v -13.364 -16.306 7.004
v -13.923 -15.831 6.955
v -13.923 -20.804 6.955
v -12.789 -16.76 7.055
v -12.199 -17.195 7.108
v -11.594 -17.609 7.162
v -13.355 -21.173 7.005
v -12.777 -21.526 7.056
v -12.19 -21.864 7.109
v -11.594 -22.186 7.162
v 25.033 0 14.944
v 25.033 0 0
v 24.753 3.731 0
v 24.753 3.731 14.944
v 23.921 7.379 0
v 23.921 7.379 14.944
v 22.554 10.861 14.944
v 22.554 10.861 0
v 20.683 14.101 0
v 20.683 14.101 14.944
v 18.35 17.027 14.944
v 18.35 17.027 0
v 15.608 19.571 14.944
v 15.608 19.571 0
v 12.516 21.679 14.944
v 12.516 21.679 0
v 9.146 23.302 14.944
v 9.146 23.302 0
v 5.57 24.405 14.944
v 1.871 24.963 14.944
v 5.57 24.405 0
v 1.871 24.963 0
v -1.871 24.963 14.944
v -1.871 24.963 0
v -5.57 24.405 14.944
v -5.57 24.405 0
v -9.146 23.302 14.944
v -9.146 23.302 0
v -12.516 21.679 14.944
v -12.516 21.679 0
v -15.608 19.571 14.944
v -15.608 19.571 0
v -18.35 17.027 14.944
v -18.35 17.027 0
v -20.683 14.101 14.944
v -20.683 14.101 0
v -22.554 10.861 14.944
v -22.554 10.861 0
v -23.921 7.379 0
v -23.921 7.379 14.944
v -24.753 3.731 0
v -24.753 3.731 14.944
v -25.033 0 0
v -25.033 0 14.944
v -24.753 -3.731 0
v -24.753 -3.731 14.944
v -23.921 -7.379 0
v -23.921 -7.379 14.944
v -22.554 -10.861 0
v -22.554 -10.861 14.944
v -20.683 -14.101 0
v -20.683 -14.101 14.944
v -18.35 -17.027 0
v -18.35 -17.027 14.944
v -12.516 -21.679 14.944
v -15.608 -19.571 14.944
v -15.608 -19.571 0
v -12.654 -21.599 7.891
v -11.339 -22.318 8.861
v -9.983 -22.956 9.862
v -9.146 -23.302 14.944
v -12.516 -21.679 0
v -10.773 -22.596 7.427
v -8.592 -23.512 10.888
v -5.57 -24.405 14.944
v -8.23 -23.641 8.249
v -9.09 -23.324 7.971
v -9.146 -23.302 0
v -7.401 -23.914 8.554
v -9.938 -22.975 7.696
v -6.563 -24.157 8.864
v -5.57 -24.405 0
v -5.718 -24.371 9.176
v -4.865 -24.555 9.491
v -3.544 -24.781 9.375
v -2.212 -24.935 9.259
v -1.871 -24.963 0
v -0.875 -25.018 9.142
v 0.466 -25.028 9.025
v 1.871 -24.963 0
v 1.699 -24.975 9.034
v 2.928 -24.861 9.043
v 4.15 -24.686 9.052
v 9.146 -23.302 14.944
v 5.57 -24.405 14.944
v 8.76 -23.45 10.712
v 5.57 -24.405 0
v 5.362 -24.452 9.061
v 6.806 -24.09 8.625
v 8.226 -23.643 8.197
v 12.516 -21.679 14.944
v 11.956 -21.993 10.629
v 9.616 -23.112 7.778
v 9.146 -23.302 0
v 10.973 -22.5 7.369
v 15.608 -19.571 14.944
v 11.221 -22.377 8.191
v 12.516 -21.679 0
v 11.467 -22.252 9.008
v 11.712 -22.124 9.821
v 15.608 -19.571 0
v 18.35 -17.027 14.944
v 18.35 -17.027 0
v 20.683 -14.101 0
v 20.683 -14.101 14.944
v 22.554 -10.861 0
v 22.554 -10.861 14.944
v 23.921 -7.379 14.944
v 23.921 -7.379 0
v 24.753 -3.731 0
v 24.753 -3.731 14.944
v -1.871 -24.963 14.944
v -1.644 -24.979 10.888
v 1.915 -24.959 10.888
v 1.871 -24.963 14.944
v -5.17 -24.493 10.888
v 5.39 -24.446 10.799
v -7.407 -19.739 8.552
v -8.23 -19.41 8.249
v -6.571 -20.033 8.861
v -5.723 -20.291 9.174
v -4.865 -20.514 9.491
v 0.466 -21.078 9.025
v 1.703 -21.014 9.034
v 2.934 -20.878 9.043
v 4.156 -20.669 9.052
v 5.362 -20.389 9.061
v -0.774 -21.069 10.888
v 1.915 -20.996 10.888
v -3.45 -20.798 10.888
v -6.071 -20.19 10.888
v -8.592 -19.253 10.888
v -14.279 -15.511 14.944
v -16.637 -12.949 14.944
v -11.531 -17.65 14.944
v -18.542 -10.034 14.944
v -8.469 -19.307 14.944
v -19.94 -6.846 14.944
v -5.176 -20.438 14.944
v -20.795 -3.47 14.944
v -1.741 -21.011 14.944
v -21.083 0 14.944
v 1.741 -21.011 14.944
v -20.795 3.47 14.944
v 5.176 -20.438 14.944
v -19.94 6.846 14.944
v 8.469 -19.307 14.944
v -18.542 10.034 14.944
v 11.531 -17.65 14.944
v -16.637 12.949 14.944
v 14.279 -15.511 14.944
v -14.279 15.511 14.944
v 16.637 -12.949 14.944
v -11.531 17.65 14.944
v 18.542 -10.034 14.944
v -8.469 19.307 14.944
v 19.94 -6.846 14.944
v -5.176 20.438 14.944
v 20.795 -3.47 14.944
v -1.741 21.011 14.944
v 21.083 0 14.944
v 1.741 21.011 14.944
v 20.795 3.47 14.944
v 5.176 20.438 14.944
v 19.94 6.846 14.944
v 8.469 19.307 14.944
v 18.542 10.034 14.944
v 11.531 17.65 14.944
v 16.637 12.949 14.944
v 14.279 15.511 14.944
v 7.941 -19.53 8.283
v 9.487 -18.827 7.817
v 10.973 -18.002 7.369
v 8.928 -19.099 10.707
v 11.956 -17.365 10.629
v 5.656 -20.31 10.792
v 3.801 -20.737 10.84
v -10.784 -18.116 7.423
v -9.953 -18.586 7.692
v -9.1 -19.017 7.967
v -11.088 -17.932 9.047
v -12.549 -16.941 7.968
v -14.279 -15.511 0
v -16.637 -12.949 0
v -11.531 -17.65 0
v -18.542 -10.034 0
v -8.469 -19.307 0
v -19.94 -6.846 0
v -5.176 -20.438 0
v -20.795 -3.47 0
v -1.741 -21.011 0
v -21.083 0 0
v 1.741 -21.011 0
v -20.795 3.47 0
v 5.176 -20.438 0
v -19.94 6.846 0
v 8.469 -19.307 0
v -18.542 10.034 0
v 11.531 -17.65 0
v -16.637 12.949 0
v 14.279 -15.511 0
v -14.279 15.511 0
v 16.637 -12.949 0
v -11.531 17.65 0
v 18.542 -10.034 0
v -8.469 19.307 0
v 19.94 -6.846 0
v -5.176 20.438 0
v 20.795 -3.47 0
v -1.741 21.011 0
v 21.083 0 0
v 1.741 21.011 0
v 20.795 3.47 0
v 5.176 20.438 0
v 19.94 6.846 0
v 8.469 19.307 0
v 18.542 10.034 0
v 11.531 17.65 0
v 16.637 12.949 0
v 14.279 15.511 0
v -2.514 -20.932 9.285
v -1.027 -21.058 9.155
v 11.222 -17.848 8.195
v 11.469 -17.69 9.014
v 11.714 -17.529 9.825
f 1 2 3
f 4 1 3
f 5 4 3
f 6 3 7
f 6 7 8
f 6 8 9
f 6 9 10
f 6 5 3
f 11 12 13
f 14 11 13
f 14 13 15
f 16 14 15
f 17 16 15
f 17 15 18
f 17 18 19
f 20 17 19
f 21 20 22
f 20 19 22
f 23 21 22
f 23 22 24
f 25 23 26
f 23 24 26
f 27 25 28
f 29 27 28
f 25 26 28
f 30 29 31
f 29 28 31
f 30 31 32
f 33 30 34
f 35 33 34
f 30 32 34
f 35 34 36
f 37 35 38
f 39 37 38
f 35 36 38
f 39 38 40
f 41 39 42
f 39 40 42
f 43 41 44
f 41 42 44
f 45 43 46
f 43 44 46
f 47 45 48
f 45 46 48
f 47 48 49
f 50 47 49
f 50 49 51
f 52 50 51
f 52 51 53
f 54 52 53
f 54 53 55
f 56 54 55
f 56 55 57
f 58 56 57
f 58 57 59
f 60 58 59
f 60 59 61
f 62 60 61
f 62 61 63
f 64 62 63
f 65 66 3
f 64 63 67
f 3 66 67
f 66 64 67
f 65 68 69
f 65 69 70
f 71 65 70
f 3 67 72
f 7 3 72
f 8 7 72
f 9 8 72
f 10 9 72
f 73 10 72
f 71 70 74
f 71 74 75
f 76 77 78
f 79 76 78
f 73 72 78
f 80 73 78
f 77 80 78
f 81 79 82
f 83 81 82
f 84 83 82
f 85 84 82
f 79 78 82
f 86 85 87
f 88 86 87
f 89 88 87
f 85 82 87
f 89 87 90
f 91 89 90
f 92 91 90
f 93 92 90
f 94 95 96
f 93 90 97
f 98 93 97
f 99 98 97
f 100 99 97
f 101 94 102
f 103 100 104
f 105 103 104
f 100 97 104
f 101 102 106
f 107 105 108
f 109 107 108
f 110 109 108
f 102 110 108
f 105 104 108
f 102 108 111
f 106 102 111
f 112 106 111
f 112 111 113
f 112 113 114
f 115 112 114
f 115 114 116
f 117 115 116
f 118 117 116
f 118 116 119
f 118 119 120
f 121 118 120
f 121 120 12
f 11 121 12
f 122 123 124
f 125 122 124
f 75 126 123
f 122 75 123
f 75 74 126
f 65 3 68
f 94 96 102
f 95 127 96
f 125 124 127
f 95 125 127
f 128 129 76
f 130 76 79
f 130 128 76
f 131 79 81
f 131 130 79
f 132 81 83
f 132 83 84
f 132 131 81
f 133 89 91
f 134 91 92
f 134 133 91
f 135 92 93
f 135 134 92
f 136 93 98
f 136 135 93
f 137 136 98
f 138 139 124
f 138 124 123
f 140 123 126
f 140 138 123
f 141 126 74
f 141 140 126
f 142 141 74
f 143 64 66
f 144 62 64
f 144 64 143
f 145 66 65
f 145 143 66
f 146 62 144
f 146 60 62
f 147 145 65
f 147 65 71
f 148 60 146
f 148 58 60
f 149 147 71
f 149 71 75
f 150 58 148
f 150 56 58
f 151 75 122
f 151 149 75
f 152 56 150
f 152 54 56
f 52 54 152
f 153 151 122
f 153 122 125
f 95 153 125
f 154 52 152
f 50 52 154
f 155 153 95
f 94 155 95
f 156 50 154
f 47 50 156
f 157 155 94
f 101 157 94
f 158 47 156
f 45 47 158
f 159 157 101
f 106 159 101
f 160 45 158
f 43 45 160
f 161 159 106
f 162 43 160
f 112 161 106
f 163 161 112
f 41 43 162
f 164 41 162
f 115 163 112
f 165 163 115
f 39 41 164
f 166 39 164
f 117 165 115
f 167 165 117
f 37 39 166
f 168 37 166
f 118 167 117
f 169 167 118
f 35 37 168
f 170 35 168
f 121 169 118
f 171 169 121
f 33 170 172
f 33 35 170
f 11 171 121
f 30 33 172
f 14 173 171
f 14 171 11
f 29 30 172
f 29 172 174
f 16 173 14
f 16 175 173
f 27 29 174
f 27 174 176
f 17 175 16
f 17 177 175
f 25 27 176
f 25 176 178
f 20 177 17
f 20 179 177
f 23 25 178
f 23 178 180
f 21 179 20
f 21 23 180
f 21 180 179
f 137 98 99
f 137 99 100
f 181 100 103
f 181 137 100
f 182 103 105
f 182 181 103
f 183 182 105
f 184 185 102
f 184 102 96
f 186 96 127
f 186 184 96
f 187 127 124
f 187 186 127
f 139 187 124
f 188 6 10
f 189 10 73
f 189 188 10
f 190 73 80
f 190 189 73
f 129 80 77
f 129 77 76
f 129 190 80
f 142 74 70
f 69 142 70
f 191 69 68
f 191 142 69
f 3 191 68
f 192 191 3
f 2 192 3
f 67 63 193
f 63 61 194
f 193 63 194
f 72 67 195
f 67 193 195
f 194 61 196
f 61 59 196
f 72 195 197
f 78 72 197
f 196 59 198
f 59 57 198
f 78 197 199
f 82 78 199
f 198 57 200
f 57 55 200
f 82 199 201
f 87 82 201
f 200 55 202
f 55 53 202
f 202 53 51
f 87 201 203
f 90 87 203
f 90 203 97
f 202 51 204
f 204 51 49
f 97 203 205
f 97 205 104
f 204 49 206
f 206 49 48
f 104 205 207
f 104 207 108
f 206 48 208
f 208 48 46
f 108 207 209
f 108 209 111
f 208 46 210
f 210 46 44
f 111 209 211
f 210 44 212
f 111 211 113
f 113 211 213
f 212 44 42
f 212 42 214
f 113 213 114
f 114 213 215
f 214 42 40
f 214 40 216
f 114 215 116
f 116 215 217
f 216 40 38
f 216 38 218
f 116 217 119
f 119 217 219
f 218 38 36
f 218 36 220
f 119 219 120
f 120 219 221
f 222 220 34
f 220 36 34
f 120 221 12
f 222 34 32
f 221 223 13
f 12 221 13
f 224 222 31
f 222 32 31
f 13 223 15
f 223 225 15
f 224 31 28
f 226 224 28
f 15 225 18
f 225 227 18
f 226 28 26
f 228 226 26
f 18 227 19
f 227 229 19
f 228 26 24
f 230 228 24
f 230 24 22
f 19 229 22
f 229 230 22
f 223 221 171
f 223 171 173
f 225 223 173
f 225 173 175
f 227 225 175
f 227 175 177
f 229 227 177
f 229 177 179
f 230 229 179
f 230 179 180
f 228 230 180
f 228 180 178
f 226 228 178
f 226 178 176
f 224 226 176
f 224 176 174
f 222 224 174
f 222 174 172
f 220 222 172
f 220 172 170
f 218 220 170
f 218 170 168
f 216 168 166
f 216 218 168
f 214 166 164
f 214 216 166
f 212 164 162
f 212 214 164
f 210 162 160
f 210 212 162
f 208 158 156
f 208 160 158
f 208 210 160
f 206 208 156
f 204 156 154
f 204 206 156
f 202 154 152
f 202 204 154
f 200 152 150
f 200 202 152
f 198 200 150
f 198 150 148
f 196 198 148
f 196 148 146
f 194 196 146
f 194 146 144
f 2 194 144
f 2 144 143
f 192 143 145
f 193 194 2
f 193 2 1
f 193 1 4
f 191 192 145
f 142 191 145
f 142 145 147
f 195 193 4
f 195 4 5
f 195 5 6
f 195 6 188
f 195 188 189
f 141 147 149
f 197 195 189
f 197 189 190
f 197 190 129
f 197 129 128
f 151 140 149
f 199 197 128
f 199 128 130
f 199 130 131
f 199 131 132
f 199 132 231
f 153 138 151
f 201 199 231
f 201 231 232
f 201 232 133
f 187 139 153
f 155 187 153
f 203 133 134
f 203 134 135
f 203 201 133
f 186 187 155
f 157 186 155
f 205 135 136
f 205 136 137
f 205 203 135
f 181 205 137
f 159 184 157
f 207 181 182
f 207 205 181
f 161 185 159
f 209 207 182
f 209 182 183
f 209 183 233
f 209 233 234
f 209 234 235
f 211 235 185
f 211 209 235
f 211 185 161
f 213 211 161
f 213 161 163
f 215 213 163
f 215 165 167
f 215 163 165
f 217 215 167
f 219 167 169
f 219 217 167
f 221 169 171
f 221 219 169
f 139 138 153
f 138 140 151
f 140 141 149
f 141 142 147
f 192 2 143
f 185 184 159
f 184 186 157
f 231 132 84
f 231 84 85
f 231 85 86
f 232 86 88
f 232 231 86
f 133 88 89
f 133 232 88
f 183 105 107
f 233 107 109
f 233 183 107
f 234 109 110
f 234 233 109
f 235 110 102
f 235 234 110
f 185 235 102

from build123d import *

# Parameters (mm, degrees)
F0_R     = 25.032826
F2_DEPTH = 14.944287
F1_R     = 21.08274
F3_DEPTH = 20.706544
F5_DEPTH = 25.4


with BuildPart() as f2:
    # F0 (on Top) → F2 (new body)
    with BuildSketch(Plane.XY):
        Circle(F0_R)
    extrude(amount=F2_DEPTH)

    # F1 (on face) → F3 (cut)
    with BuildSketch(Plane.XY):
        Circle(F1_R)
    extrude(amount=F3_DEPTH, mode=Mode.SUBTRACT)

    # F4 (on Front) → F5 (cut)
    with BuildSketch(Plane.XZ):
        Polygon((-8.591931, 10.888215), (-13.923068, 6.954562), (-11.59393, 7.161595), (-8.229621, 8.248527), (-4.865311, 9.490732), (0.465825, 9.024907), (5.362451, 9.060643), (10.972824, 7.368632), (11.956234, 10.629423), (1.915064, 10.888215), align=None)
    extrude(amount=F5_DEPTH, mode=Mode.SUBTRACT)


solid = f2.part
